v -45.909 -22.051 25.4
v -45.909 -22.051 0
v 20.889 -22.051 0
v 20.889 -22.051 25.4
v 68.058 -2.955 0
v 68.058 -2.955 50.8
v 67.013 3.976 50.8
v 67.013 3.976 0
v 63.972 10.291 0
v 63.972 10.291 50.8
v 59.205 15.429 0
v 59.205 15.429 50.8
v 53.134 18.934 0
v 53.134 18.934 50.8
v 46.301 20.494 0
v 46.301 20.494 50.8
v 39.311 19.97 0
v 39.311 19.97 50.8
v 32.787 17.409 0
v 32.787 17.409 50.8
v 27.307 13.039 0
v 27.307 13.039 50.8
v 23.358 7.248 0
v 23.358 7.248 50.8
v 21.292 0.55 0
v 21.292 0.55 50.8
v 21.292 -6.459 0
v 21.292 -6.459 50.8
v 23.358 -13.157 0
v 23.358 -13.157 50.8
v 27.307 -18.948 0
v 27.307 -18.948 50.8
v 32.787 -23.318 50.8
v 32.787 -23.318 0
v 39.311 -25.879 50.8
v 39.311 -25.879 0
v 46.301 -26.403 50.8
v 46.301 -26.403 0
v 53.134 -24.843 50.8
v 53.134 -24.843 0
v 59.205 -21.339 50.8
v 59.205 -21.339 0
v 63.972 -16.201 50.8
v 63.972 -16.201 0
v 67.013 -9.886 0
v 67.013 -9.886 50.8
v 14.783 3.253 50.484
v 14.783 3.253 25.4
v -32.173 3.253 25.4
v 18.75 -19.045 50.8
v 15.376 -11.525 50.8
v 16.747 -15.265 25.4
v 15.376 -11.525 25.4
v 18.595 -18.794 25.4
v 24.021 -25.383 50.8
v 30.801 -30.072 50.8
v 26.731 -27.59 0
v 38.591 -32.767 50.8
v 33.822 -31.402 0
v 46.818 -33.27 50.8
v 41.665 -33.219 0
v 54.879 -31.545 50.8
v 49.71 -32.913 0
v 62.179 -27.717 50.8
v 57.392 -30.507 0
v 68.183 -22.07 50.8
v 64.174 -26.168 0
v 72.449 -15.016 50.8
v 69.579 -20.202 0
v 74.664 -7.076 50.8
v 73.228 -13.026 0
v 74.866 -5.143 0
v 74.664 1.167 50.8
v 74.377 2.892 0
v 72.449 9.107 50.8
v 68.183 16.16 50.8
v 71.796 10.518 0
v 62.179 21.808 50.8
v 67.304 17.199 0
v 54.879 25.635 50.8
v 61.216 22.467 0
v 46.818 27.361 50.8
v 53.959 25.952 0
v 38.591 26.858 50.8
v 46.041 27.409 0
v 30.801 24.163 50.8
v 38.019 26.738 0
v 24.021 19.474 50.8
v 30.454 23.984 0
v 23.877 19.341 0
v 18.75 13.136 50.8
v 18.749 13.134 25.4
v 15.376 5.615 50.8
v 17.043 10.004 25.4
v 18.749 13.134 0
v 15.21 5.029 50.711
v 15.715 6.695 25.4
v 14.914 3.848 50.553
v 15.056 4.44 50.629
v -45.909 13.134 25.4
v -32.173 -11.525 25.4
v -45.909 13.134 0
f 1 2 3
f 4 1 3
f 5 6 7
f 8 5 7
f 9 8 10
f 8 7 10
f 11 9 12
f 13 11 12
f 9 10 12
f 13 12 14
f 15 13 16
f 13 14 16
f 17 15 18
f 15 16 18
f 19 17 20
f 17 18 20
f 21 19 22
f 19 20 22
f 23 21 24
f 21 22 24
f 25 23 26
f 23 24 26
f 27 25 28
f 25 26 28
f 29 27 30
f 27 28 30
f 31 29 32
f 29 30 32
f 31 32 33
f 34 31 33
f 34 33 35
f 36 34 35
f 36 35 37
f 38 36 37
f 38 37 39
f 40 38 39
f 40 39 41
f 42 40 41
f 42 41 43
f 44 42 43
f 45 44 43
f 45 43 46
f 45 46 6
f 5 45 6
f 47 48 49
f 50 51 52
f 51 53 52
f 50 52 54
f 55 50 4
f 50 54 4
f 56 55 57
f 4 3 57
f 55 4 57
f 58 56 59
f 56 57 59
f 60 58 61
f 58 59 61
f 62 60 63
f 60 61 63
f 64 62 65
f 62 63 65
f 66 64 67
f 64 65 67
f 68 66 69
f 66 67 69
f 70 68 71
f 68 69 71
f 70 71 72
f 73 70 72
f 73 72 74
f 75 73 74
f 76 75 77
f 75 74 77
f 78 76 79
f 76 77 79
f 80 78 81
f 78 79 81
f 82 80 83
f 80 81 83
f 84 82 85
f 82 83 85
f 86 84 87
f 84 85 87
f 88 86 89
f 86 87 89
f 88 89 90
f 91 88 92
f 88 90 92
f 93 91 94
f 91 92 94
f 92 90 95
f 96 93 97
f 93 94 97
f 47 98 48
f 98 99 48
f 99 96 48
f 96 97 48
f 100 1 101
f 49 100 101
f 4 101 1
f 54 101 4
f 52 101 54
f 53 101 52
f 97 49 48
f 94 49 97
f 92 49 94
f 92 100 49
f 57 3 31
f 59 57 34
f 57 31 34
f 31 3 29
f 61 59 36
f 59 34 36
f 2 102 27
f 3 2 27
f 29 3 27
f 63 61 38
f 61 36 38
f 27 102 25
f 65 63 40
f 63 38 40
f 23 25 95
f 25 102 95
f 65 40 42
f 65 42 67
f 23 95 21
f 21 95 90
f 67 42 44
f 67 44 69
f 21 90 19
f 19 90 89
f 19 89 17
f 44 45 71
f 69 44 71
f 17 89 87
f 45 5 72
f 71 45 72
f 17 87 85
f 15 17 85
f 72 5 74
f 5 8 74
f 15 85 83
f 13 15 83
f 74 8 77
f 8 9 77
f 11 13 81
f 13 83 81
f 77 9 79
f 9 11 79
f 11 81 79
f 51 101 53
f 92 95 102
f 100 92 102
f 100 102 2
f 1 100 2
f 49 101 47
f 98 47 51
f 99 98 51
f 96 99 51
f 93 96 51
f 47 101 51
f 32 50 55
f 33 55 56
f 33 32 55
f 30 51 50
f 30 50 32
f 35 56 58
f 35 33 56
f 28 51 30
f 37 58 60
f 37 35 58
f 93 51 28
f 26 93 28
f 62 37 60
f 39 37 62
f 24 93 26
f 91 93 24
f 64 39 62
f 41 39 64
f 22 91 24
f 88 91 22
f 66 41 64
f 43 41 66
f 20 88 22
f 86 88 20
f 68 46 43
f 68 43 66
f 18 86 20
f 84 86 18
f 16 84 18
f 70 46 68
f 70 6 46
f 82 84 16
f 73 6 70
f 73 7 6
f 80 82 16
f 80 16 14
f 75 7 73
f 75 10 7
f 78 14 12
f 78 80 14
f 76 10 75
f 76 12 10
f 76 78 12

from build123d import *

# Parameters (mm, degrees)
F1_DEPTH = 25.4
F2_R     = 30.4008834271
F3_DEPTH = 50.8
F4_R     = 23.5140896475
F5_DEPTH = 1676.4
F7_DEPTH = 25.4
F9_DEPTH = 2514.6


with BuildPart() as f1:
    # F0 (on Top) → F1 (new body)
    with BuildSketch(Plane.XY):
        with BuildLine():
            Line((24.3670896719, 13.1341721863), (-45.9093526006, 13.1341721863))
            Line((-45.9093526006, 13.1341721863), (-45.9093526006, -22.0509488136))
            Line((-45.9093526006, -22.0509488136), (27.5870569542, -22.0509488136))
            ThreePointArc((27.5870569542, -22.0509488136), (16.0056375447, -5.3709245227), (24.3670896719, 13.1341721863))
        make_face()
    extrude(amount=F1_DEPTH)

    # F2 (on Top) → F3 (join)
    with BuildSketch(Plane.XY):
        with Locations((44.5437170565, -2.9546946753)):
            Circle(F2_R)
    extrude(amount=F3_DEPTH)

    # F4 (on face) → F5 (cut)
    with BuildSketch(Plane.XY.offset(50.8)):
        with Locations((44.5437170565, -2.9546946753)):
            Circle(F4_R)
    extrude(amount=-F5_DEPTH, mode=Mode.SUBTRACT)

    # F6 (on face) → F7 (join)
    with BuildSketch(Plane.XY.offset(25.4)):
        with BuildLine():
            Line((14.7834576284, 3.2534187194), (-32.1726948023, 3.2534187194))
            Line((-32.1726948023, 3.2534187194), (-32.1726948023, -11.5247956985))
            Line((-32.1726948023, -11.5247956985), (15.375805208, -11.5247956985))
            ThreePointArc((15.375805208, -11.5247956985), (14.167225359, -4.1722599931), (14.7834576284, 3.2534187194))
        make_face()
    extrude(amount=F7_DEPTH)

    # F8 (on face) → F9 (cut)
    with BuildSketch(Plane.XZ.offset(11.5247956985)):
        Polygon((-32.1726948023, 50.8), (-32.1726948023, 25.4), (15.375805208, 50.8), align=None)
    extrude(amount=-F9_DEPTH, mode=Mode.SUBTRACT)


solid = f1.part
